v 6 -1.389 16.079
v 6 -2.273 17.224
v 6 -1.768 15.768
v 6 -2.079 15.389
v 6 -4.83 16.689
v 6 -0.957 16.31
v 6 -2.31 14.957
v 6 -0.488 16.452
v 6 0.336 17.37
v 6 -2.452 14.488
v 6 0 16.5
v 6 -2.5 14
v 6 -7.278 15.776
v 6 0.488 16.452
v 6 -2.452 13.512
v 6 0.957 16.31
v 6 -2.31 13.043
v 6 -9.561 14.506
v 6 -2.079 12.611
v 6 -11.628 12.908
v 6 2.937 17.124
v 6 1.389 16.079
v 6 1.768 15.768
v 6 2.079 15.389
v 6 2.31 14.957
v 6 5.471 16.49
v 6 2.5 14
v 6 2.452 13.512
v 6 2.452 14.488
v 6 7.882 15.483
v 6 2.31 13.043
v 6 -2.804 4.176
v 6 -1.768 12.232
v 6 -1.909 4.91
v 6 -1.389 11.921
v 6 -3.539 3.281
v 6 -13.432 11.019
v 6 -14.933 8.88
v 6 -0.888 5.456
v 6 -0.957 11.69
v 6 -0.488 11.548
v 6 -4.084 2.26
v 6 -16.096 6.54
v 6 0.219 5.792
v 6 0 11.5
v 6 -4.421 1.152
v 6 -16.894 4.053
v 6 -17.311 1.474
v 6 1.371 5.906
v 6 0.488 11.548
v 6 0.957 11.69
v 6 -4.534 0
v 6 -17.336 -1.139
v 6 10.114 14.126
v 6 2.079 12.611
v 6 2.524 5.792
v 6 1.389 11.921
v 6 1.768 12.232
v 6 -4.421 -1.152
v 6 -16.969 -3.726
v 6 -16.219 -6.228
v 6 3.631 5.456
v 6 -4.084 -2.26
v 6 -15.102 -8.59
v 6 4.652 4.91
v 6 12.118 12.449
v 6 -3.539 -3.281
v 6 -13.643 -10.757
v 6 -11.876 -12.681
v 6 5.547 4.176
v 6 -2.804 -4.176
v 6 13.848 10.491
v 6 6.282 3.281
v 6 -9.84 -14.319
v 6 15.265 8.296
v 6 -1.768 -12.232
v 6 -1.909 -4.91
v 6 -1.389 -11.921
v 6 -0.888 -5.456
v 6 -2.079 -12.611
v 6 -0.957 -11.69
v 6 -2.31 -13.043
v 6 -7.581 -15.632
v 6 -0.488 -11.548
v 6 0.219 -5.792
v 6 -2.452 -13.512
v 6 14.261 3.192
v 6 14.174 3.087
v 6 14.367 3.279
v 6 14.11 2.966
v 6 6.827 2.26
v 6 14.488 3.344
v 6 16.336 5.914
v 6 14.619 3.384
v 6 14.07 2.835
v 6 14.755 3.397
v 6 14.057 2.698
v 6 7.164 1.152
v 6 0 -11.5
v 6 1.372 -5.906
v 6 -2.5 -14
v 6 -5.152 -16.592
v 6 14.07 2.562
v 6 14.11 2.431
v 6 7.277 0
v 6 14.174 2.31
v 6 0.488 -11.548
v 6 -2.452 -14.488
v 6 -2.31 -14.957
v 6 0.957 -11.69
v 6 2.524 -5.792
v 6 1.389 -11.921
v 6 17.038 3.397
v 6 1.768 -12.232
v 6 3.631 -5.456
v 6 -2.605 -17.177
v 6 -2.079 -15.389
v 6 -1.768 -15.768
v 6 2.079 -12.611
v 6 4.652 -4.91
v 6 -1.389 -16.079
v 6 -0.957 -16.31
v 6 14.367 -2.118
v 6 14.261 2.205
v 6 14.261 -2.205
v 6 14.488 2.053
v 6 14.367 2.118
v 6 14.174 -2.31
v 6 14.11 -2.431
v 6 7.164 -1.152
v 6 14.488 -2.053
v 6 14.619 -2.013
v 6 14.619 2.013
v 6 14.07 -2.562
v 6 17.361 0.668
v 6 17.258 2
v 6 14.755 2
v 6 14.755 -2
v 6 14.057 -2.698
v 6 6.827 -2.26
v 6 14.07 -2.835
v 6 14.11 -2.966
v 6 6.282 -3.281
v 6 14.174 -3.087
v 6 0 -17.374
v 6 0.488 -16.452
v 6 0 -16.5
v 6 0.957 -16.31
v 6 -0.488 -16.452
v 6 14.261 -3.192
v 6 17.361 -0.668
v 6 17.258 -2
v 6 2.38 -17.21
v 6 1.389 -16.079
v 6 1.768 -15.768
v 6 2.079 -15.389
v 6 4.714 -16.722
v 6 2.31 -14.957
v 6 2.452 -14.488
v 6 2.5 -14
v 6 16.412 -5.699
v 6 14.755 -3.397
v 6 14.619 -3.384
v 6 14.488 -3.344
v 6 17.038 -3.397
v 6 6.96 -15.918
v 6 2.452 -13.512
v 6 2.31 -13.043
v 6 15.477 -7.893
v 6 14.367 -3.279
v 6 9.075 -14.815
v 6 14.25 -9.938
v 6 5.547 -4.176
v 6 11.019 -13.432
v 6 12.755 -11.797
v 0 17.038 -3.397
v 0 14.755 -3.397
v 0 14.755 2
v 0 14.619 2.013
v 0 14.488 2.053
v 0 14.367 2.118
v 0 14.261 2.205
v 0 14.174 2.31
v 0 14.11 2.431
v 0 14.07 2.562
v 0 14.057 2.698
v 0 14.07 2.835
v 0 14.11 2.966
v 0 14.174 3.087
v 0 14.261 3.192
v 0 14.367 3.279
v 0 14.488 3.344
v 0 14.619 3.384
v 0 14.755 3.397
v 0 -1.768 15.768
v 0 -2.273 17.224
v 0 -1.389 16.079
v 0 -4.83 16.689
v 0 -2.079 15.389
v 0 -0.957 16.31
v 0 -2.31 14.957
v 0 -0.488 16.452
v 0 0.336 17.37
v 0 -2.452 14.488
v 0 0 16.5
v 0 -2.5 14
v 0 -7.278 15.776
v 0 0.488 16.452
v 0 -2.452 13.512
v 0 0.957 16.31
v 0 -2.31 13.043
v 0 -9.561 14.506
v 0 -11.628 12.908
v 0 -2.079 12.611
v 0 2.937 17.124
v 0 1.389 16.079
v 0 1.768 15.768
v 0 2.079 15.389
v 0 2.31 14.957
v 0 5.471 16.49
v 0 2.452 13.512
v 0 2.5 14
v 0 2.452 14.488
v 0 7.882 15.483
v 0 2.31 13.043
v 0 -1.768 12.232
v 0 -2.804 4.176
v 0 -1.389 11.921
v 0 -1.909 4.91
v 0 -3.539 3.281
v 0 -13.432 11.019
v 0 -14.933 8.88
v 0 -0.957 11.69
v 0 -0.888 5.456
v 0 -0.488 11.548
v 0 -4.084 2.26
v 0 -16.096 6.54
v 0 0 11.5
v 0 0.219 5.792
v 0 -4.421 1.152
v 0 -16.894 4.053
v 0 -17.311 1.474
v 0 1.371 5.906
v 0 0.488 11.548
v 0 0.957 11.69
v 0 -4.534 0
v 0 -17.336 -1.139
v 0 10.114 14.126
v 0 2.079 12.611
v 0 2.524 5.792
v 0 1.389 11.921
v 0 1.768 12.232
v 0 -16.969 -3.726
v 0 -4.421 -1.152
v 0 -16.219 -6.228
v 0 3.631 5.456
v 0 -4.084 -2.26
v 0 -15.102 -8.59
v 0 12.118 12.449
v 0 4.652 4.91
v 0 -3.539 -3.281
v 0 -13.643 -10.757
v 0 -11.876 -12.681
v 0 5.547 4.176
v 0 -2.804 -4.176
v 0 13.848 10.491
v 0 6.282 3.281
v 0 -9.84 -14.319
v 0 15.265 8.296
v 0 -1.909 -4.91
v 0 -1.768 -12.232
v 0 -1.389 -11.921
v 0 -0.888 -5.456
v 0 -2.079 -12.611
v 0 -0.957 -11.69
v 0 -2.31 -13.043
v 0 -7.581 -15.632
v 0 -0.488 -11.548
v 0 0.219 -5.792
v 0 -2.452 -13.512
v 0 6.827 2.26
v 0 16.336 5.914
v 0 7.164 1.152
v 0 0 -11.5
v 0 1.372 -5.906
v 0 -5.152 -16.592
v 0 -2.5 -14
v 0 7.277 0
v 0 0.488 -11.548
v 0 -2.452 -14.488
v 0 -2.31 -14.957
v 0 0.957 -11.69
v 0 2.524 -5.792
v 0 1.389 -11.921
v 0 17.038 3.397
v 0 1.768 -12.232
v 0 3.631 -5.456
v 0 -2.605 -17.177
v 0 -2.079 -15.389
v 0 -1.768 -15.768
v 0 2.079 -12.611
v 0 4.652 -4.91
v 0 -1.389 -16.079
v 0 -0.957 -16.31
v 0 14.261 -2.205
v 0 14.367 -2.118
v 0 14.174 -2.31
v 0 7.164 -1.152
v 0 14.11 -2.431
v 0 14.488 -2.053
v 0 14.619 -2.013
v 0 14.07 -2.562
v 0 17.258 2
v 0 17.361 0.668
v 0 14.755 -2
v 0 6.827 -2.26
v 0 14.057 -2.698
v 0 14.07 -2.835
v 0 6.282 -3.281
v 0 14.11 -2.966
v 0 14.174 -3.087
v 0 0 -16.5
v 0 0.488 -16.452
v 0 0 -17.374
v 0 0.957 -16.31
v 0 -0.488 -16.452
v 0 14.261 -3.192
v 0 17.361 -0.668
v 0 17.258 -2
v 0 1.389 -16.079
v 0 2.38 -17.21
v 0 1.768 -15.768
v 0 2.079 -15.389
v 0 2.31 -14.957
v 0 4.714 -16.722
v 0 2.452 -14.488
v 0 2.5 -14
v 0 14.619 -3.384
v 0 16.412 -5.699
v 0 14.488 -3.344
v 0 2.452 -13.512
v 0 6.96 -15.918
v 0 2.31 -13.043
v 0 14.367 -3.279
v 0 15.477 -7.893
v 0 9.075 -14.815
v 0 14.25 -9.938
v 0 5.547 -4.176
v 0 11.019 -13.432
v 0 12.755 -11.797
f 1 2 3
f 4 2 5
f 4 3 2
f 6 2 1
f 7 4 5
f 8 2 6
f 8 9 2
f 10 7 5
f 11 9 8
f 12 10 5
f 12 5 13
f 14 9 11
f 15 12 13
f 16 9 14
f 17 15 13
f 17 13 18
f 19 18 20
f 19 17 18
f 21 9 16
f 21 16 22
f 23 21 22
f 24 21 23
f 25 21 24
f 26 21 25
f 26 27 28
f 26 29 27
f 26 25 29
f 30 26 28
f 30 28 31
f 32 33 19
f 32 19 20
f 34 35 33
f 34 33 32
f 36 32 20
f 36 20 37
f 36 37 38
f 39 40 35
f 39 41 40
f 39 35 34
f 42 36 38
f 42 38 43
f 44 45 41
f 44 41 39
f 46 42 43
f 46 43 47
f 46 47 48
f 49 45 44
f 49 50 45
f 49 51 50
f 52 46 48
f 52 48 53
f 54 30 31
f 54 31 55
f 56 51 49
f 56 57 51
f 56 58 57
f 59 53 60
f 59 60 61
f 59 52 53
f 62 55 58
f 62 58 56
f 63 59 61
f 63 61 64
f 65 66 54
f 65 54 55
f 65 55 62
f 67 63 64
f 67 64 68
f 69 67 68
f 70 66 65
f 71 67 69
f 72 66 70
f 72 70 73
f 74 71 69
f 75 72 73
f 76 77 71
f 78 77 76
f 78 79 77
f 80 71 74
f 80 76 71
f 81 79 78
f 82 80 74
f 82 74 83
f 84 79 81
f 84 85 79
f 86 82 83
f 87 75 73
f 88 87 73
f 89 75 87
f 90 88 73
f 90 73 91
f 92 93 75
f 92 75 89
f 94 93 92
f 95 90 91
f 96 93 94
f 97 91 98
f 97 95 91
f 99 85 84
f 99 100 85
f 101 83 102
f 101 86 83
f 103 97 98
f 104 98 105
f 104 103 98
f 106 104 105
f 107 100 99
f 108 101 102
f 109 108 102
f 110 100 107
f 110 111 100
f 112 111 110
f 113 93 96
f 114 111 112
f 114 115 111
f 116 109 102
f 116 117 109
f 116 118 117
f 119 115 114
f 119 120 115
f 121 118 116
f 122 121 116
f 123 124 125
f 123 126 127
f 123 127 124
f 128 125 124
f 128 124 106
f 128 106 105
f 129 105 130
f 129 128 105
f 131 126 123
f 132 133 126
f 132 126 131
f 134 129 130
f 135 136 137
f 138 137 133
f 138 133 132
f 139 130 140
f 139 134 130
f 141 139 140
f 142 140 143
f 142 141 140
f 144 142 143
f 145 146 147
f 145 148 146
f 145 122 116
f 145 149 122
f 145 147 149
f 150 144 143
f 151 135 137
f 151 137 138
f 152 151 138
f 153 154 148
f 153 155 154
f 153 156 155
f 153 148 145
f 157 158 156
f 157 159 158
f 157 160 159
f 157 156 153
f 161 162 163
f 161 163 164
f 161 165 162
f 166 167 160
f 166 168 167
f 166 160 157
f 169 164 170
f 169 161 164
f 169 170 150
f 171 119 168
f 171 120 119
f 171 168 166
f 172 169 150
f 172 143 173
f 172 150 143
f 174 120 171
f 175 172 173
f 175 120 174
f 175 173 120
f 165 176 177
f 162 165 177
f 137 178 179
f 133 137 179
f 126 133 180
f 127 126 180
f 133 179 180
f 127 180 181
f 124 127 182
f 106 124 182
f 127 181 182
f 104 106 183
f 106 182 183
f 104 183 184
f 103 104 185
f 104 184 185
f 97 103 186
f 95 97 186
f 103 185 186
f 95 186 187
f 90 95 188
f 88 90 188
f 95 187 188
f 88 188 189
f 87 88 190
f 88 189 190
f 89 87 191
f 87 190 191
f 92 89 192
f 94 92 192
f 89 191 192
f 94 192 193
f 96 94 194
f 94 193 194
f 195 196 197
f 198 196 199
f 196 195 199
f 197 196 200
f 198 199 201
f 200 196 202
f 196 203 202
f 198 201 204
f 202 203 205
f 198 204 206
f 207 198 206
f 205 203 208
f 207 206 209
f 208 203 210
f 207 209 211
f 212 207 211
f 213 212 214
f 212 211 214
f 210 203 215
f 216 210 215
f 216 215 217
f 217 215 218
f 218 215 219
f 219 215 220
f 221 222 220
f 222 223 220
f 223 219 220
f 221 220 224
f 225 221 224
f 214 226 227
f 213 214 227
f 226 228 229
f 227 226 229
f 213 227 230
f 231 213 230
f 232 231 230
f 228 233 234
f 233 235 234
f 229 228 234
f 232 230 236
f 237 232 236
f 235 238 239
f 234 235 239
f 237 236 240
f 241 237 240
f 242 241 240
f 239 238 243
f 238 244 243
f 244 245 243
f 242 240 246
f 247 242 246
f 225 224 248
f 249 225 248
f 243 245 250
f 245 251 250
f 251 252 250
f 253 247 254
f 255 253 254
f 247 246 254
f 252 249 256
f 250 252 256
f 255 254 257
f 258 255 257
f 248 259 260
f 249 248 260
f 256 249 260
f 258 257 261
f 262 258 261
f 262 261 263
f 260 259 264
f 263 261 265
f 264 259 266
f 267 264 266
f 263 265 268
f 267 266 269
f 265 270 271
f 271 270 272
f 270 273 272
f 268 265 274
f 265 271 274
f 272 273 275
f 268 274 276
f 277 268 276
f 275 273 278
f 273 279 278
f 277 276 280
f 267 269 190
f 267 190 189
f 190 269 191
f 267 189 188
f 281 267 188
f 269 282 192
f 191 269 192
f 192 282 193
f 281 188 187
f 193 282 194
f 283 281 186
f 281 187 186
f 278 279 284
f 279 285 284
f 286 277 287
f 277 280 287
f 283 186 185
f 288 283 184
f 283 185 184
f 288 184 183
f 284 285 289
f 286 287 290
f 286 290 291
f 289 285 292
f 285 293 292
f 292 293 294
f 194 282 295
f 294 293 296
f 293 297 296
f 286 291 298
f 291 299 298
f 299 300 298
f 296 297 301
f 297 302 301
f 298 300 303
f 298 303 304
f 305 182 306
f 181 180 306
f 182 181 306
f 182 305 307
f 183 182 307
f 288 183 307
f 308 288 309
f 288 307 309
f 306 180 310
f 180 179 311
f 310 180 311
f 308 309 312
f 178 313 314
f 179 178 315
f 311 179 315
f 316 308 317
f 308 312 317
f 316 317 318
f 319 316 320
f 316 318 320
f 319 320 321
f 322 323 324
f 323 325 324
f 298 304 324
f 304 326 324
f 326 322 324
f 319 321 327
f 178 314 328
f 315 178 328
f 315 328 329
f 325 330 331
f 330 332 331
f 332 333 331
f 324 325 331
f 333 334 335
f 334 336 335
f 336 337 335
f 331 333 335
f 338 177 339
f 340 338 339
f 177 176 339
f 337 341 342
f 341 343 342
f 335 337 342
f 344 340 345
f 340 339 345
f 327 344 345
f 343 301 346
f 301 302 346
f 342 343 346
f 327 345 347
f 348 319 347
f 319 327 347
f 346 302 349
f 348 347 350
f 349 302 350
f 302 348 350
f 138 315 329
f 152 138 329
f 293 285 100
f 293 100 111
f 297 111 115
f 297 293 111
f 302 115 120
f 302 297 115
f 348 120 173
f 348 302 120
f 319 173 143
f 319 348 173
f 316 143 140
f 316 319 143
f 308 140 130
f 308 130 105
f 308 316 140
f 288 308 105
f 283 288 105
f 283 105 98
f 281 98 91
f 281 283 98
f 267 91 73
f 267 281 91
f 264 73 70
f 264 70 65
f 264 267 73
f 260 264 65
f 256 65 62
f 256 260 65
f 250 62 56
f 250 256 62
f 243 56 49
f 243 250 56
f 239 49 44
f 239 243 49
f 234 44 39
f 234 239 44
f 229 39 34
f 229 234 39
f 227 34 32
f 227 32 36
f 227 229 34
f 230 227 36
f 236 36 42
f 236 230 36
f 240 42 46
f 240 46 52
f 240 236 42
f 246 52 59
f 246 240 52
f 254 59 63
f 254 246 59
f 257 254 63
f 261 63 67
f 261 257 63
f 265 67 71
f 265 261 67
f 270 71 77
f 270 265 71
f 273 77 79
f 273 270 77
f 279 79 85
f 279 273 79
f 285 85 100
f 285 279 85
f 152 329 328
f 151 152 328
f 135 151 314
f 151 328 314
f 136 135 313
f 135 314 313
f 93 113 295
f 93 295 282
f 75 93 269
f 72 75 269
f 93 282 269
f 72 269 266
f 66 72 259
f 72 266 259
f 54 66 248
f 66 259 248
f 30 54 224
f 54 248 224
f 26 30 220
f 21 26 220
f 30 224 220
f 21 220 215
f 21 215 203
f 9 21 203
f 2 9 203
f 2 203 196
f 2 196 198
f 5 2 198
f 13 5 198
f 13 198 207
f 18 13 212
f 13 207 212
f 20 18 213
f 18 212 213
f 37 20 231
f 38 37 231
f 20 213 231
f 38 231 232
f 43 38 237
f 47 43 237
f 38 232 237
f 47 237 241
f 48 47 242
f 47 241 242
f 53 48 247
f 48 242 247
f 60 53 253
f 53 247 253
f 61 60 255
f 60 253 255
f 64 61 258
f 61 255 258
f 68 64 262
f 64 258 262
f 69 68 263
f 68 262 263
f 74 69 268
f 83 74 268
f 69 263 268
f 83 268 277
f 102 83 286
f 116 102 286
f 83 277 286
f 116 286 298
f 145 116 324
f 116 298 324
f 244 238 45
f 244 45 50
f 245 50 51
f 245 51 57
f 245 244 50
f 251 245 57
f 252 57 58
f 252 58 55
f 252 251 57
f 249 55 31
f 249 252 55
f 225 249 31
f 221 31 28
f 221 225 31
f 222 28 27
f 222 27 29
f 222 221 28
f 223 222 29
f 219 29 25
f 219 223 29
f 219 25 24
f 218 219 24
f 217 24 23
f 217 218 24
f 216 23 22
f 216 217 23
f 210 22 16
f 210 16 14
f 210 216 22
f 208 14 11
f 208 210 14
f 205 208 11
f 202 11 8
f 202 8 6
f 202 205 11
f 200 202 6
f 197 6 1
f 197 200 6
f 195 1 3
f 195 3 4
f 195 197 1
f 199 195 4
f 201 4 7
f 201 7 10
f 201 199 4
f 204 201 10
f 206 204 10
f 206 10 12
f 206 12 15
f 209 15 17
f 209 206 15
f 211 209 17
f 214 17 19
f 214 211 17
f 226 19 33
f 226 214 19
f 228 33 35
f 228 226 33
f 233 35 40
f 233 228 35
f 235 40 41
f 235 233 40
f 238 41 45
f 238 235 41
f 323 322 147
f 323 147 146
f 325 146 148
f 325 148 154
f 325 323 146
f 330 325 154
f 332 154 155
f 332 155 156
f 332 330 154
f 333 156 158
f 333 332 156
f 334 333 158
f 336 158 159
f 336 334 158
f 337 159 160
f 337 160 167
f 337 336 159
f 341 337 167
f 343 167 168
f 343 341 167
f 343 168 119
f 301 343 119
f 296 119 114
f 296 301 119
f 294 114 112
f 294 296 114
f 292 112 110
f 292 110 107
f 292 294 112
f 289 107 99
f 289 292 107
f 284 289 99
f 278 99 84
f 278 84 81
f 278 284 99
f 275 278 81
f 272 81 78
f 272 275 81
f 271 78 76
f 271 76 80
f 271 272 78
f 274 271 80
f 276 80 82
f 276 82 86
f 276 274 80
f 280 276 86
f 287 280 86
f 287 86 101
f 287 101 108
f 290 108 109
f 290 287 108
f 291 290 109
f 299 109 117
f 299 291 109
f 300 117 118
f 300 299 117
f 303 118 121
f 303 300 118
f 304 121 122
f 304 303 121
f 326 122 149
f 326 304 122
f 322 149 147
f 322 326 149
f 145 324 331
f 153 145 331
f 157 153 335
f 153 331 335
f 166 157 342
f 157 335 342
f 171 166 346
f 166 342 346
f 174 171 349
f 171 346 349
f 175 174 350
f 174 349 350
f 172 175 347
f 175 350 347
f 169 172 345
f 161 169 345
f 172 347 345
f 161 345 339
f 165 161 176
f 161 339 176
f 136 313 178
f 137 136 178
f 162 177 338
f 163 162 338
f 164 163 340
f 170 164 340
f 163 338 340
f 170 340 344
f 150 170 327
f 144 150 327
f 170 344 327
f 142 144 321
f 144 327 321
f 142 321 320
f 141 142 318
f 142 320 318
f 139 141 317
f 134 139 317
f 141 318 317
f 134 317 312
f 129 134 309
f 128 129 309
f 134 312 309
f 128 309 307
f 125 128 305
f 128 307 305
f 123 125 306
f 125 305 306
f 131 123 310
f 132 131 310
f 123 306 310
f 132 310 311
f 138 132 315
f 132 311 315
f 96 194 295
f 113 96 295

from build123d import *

# Parameters (mm, degrees)
SKETCH1_R           = 2.5
SKETCH1_R_2         = 5.9055
BOSS_EXTRUDE1_DEPTH = 6


with BuildPart() as part:
    # Sketch1 → Boss-Extrude1 (new body)
    with BuildSketch(Plane(origin=(0, 0, 0), x_dir=(0, 0, -1), z_dir=(1, 0, 0))):
        with BuildLine():
            ThreePointArc((3.397, 14.755273557), (2.6985, 14.056773557), (2, 14.755273557))
            Line((2, 14.755273557), (2, 17.25809888))
            ThreePointArc((2, 17.25809888), (0, 17.3736), (-2, 17.25809888))
            Line((-2, 17.25809888), (-2, 14.755273557))
            ThreePointArc((-2, 14.755273557), (-2.6985, 14.056773557), (-3.397, 14.755273557))
            Line((-3.397, 14.755273557), (-3.397, 17.038261882))
            ThreePointArc((-3.397, 17.038261882), (-11.018708131, -13.432425249), (17.3736, 0))
            ThreePointArc((17.3736, 0), (13.432425249, 11.018708131), (3.397, 17.038261882))
            Line((3.397, 17.038261882), (3.397, 14.755273557))
        make_face()
        with Locations((-14, 0)):
            Circle(SKETCH1_R, mode=Mode.SUBTRACT)
        with Locations((14, 0)):
            Circle(SKETCH1_R, mode=Mode.SUBTRACT)
        with Locations((0, 1.3715)):
            Circle(SKETCH1_R_2, mode=Mode.SUBTRACT)
    extrude(amount=BOSS_EXTRUDE1_DEPTH)


solid = part.part
